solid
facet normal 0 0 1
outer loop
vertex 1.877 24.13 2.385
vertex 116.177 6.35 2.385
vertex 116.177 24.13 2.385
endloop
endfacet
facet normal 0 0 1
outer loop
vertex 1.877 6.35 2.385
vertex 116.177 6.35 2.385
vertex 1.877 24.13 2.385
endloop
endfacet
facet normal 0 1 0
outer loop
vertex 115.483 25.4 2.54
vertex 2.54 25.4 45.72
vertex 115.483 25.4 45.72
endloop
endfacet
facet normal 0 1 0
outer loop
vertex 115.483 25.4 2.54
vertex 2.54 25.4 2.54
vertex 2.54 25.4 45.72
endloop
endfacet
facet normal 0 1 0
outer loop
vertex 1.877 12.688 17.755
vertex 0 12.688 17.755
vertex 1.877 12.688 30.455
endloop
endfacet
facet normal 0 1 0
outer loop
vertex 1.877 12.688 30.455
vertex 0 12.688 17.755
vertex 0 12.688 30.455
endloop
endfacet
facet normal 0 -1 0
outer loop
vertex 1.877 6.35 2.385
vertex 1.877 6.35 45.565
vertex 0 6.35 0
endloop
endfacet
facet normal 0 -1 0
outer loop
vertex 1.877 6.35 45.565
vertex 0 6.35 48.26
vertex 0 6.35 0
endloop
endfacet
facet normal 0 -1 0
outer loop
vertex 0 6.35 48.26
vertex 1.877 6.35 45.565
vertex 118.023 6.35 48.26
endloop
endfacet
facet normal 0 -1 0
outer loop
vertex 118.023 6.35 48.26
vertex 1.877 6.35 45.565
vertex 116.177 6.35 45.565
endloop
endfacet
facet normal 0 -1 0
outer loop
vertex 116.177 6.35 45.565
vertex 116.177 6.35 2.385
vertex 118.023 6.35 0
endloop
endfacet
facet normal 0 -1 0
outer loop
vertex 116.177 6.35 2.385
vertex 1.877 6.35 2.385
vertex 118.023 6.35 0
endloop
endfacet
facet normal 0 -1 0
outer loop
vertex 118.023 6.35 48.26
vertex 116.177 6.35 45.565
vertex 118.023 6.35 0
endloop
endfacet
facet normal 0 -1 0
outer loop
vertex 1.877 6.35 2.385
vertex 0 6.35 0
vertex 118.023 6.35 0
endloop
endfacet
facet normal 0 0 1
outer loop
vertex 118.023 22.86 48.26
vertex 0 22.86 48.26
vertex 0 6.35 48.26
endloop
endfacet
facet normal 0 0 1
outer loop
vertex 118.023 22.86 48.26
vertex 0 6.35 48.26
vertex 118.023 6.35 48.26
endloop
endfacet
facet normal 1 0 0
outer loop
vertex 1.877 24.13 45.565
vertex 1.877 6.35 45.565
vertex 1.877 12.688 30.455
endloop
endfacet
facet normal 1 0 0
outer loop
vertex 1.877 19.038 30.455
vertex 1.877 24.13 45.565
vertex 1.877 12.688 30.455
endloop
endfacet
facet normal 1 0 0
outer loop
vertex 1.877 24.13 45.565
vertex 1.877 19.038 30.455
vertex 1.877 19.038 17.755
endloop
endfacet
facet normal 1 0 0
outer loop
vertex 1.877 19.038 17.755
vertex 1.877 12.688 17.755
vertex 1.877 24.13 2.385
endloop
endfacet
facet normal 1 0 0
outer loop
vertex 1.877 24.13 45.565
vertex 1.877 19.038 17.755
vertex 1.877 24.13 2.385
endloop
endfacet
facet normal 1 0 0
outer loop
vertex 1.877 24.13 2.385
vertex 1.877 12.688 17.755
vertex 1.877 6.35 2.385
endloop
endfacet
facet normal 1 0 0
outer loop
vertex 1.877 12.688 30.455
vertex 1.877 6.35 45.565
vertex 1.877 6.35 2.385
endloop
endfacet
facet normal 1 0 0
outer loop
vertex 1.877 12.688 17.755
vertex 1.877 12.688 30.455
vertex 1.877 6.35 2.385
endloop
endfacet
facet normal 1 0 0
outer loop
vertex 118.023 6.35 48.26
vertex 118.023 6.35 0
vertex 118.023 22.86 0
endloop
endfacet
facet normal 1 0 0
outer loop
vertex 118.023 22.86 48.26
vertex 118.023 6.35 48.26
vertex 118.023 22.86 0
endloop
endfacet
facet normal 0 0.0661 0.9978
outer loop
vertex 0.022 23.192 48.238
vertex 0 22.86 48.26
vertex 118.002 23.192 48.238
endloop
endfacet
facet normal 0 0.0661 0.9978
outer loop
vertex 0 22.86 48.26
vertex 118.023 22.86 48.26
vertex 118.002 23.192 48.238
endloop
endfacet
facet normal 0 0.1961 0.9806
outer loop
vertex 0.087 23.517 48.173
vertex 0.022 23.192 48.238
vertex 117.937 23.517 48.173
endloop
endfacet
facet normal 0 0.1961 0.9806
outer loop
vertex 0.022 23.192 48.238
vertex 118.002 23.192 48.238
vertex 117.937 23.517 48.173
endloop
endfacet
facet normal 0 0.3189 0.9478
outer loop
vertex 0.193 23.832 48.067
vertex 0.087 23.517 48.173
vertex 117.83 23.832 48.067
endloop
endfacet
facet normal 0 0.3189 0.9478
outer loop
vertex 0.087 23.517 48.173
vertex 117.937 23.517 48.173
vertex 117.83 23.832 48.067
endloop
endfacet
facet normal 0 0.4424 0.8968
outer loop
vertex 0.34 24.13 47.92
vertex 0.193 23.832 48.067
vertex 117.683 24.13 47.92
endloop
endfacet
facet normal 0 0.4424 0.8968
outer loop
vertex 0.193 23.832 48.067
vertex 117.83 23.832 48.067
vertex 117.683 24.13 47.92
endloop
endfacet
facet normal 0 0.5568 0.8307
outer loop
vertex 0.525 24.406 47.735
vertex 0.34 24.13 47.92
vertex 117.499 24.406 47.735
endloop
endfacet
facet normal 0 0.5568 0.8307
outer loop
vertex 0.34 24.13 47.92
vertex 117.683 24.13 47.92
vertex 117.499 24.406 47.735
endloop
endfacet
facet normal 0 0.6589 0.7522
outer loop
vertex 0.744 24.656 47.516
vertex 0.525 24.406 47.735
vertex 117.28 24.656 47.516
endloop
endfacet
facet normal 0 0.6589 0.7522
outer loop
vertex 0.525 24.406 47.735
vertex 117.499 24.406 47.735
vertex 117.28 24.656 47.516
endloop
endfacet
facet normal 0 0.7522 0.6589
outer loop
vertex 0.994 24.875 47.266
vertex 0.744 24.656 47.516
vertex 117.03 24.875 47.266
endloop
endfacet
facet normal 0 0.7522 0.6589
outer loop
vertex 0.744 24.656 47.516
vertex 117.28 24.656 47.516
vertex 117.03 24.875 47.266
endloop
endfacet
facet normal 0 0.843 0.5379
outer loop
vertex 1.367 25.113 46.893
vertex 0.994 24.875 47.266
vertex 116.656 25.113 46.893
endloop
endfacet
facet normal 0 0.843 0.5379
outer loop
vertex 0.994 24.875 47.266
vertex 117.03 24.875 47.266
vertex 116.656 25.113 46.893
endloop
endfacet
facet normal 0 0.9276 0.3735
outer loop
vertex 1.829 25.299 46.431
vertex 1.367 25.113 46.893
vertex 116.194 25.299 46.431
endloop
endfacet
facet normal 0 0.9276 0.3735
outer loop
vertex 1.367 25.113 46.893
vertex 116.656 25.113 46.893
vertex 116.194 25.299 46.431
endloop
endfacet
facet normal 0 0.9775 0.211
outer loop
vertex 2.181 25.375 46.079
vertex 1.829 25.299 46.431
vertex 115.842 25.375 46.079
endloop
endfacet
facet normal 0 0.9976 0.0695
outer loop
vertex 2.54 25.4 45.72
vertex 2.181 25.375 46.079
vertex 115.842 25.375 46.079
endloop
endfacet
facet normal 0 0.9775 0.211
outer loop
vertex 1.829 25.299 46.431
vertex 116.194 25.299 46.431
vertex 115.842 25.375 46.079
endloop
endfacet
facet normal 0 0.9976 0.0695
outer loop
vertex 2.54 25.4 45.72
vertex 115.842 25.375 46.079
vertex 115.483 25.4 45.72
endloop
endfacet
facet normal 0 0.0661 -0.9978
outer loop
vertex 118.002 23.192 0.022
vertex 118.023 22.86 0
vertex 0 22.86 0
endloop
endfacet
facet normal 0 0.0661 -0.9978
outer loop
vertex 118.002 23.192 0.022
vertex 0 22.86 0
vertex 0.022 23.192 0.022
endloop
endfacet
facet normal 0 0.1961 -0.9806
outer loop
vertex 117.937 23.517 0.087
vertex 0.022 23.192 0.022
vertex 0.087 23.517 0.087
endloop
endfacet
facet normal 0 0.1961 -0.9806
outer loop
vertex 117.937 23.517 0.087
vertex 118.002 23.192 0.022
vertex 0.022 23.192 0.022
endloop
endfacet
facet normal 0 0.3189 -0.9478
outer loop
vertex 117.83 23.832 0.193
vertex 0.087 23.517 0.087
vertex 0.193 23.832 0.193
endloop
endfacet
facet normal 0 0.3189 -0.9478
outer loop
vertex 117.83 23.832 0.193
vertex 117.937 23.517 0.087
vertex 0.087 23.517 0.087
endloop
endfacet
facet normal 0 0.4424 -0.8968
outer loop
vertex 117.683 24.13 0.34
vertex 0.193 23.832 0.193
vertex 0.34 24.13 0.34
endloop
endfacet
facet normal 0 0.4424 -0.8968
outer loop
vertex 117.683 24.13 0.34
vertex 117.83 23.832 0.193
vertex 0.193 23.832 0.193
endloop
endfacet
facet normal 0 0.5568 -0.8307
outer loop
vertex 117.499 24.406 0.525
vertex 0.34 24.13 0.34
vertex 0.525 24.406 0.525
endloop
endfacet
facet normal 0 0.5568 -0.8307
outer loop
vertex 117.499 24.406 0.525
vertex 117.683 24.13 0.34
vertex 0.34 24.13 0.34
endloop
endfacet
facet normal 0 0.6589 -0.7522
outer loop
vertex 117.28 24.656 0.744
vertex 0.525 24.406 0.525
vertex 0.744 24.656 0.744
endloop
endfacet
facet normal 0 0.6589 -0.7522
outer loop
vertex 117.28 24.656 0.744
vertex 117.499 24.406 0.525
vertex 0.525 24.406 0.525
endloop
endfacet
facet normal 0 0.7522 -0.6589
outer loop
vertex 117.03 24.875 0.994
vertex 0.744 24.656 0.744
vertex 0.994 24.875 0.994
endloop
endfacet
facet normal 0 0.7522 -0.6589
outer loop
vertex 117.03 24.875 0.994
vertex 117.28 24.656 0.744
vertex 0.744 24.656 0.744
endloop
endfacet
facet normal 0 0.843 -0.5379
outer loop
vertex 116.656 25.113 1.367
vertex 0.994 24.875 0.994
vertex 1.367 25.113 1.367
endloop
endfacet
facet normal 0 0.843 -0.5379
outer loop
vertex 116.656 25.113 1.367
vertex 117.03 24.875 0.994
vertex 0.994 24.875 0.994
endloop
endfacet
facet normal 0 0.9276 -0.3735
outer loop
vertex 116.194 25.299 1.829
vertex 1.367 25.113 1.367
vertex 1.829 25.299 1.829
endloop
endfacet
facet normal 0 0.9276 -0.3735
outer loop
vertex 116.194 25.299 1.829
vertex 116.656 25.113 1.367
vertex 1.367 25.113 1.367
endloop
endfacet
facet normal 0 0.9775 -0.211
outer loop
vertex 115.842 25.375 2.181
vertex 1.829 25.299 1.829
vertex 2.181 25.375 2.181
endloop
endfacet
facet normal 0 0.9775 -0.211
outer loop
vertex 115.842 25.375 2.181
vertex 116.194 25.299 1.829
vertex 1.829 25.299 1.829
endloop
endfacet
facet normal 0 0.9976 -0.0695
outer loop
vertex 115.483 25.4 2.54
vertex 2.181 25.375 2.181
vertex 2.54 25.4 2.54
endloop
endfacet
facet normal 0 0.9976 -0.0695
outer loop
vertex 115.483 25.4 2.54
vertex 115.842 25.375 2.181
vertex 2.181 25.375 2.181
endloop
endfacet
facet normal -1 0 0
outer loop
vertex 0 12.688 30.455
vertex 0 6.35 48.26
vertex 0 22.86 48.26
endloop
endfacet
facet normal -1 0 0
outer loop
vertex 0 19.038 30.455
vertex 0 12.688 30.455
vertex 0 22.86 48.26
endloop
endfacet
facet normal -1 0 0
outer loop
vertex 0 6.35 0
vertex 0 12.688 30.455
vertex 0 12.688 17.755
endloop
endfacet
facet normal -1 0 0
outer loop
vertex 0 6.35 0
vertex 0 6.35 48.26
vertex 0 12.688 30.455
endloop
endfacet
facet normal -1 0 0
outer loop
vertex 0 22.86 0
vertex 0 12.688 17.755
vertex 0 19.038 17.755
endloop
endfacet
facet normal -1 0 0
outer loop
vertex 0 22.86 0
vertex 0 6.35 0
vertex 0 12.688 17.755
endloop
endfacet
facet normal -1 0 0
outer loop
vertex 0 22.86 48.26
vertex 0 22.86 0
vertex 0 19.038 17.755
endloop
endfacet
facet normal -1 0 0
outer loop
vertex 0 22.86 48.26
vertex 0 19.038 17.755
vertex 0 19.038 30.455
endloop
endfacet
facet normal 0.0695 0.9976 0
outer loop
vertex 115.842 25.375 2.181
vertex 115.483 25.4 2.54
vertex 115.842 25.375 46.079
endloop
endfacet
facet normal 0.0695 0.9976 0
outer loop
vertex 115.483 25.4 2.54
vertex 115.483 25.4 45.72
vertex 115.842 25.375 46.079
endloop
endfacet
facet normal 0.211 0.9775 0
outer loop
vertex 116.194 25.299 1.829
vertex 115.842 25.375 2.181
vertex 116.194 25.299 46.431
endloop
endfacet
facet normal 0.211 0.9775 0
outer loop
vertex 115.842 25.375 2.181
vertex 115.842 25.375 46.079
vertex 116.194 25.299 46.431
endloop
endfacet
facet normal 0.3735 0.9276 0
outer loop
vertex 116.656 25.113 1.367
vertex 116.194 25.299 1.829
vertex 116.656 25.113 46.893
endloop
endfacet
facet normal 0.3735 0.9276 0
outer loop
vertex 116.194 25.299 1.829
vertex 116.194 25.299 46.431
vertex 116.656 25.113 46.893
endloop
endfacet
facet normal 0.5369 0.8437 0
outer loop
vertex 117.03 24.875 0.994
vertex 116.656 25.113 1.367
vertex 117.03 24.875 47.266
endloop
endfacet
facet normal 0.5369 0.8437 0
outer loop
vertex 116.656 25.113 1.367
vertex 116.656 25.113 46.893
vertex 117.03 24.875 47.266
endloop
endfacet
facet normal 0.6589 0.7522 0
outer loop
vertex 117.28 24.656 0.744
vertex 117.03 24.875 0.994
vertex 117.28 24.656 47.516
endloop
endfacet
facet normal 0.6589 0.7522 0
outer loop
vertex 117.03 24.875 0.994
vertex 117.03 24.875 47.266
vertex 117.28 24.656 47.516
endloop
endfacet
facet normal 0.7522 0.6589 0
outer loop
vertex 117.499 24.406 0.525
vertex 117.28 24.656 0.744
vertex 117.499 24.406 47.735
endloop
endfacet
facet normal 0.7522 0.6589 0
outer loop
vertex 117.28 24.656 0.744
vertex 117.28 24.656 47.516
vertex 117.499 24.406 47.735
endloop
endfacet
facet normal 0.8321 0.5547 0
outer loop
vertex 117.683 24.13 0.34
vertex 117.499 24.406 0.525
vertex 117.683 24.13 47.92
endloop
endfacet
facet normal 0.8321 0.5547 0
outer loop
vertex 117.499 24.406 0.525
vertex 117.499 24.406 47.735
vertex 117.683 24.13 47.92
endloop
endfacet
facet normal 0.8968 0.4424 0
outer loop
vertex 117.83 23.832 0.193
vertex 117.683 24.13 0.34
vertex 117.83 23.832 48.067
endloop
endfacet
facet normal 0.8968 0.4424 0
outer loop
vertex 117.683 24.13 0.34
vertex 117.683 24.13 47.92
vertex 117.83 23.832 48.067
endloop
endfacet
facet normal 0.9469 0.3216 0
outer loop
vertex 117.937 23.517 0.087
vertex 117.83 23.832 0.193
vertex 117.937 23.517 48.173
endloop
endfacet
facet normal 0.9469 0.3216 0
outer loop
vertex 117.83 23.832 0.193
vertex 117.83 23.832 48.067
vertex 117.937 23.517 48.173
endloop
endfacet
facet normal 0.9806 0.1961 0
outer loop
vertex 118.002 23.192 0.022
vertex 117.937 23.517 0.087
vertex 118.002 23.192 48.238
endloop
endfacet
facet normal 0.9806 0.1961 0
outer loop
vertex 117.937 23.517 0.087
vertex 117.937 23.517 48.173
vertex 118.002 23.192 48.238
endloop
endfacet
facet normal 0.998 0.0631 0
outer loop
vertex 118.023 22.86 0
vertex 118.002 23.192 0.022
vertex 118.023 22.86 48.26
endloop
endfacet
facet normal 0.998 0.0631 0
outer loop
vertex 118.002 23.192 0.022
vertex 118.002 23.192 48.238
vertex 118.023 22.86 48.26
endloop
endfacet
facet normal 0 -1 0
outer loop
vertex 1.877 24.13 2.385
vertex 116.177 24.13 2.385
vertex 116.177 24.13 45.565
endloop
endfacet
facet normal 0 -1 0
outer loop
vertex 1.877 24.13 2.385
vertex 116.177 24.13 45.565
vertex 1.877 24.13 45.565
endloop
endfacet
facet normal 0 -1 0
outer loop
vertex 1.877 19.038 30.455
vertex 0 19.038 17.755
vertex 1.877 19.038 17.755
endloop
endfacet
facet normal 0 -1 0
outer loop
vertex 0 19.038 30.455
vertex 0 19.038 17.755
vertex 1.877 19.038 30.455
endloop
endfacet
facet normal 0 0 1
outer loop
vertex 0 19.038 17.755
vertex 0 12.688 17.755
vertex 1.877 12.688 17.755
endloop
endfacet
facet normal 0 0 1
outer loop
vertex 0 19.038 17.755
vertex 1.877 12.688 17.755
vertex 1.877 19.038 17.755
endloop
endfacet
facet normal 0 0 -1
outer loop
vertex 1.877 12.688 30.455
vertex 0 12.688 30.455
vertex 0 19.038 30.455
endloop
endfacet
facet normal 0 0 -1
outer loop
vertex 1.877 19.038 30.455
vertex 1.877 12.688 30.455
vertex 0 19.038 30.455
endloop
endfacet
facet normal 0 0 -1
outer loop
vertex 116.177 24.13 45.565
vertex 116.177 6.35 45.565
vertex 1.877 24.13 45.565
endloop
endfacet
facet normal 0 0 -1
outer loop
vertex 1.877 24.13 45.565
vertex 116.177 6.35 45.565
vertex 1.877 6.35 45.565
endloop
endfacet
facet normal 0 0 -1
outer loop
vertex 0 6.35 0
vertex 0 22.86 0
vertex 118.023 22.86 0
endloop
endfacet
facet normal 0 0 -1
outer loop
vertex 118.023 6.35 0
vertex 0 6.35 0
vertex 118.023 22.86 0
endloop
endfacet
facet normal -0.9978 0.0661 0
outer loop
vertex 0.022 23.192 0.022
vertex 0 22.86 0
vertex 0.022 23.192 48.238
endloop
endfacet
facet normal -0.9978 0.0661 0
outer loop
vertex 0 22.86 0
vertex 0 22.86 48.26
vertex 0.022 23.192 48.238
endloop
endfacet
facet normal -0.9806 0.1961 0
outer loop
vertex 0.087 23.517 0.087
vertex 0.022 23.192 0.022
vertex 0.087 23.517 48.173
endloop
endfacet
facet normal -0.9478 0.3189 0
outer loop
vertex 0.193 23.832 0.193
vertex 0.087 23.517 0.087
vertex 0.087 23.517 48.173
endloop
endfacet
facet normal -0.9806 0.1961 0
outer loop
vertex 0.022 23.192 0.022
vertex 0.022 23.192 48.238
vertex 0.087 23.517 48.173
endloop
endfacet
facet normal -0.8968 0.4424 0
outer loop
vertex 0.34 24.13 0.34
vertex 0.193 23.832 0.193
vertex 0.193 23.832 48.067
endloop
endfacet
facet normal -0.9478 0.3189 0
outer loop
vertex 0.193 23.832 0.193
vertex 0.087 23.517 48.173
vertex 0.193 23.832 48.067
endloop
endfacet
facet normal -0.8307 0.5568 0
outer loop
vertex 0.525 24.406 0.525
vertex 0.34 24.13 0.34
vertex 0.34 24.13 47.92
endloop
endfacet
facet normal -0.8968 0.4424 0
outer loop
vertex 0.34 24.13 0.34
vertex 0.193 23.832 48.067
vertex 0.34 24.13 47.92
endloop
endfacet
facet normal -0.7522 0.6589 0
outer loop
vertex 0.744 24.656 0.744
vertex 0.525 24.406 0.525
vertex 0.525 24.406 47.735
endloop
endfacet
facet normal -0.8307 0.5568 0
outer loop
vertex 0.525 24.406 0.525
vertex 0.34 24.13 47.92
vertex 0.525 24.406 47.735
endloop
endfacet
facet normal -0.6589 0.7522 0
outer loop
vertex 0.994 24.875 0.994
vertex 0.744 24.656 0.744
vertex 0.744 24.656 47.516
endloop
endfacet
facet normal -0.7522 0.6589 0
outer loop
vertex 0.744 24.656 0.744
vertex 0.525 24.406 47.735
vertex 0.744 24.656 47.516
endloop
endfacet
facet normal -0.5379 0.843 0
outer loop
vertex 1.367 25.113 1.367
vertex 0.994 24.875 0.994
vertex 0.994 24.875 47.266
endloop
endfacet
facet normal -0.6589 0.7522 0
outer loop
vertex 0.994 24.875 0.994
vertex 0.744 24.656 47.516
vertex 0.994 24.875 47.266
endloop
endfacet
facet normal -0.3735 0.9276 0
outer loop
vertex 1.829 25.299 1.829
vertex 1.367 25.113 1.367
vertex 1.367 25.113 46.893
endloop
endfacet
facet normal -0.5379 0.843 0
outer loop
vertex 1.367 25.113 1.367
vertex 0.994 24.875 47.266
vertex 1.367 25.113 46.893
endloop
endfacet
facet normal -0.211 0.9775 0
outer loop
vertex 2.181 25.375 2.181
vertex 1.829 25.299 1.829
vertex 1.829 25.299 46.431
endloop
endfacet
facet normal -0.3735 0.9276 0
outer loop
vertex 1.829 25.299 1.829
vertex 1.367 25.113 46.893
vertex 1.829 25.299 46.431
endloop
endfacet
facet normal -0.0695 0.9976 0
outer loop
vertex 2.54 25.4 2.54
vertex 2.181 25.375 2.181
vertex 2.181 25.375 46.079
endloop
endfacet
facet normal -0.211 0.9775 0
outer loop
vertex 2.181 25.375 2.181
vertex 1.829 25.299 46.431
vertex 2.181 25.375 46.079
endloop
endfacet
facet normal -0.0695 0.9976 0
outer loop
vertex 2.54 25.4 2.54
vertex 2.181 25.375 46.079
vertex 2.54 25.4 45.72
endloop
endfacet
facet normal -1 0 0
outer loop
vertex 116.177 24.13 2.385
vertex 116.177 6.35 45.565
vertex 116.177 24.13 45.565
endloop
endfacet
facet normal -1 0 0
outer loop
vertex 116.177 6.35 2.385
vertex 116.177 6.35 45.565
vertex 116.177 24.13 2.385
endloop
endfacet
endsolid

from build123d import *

# Parameters (mm, degrees)
SKETCH2_W           = 118.023469291
SKETCH2_H           = 19.05
BOSS_EXTRUDE1_DEPTH = 48.26
SKETCH24_W          = 114.3
SKETCH24_H          = 43.18
CUT_EXTRUDE2_DEPTH  = 17.78
SKETCH25_W          = 12.7
SKETCH25_H          = 6.35
CUT_EXTRUDE3_DEPTH  = 6.604
FILLET1_R           = 2.54


with BuildPart() as part:
    # Sketch2 → Boss-Extrude1 (new body)
    with BuildSketch(Plane.XY):
        with Locations((59.011734646, 15.875)):
            Rectangle(SKETCH2_W, SKETCH2_H)
    extrude(amount=BOSS_EXTRUDE1_DEPTH)

    # Sketch24 → Cut-Extrude2 (cut)
    with BuildSketch(Plane(origin=(0, 6.35, 0), x_dir=(-1, 0, 0), z_dir=(0, -1, 0))):
        with Locations((-59.026642295, -23.975075688)):
            Rectangle(SKETCH24_W, SKETCH24_H)
    extrude(amount=-CUT_EXTRUDE2_DEPTH, mode=Mode.SUBTRACT)

    # Sketch25 → Cut-Extrude3 (cut)
    with BuildSketch(Plane.ZY):
        with Locations((24.105050581, 15.863147592)):
            Rectangle(SKETCH25_W, SKETCH25_H)
    extrude(amount=-CUT_EXTRUDE3_DEPTH, mode=Mode.SUBTRACT)

    # Fillet1
    fillet1_edges = [part.edges().sort_by_distance(p)[0] for p in [
        (59.011734646, 25.4, 48.26),
        (59.011734646, 25.4, 0),
        (0, 25.4, 24.13),
        (118.023469291, 25.4, 24.13),
    ]]
    fillet(fillet1_edges, radius=FILLET1_R)


solid = part.part
